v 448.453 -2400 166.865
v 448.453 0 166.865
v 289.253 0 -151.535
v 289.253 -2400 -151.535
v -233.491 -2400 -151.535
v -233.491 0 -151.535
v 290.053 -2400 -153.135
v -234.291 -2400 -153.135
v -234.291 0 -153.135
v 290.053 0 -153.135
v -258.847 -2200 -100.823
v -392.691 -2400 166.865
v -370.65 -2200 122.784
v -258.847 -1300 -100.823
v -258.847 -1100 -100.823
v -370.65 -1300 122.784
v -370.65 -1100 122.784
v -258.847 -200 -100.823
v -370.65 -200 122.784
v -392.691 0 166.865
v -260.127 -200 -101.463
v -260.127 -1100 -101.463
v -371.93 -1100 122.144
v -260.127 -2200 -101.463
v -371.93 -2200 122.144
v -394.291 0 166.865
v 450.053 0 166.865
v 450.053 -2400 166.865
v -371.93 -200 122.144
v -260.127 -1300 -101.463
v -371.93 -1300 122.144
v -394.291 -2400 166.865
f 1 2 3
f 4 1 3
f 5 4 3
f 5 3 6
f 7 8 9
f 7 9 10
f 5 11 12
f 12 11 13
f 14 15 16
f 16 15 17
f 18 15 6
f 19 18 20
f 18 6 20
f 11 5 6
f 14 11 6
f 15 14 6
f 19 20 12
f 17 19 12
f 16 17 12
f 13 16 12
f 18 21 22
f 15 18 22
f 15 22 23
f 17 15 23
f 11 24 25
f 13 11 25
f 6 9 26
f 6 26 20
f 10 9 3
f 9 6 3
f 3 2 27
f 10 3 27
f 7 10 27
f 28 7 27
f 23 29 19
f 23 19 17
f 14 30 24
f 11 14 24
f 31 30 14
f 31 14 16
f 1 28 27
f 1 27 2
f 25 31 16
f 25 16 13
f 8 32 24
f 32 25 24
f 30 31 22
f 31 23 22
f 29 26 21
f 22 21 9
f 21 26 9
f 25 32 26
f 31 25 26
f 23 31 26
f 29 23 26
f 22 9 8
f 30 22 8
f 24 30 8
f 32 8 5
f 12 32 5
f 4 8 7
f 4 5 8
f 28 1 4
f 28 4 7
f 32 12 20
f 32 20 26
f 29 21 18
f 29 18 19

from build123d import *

# Parameters (mm, degrees)
F1_DEPTH = 2400
F2_W     = 900
F2_H     = 250
F3_DEPTH = 1.6
F4_W     = 900
F4_H     = 250
F5_DEPTH = 1.6


with BuildPart() as f1:
    # F0 (on Front) → F1 (new body)
    with BuildSketch(Plane.XZ):
        Polygon((-239.018946, -140.479133), (-388.218946, 157.920867), (-392.691082, 166.865139), (-394.291082, 166.865139), (-234.291082, -153.134861), (290.052568, -153.134861), (450.052568, 166.865139), (448.452568, 166.865139), (443.980432, 157.920867), (294.780432, -140.479133), (289.252568, -151.534861), (276.891889, -151.534861), (-221.130403, -151.534861), (-233.491082, -151.534861), align=None)
    extrude(amount=F1_DEPTH)

    # F2 (on face) → F3 (cut)
    with BuildSketch(Plane(origin=(-248.68681, 0, -124.343405), x_dir=(0, -1, 0), z_dir=(-0.894427, 0, -0.447214))):
        with Locations((1750, 150.58105)):
            Rectangle(F2_W, F2_H)
    extrude(amount=-F3_DEPTH, mode=Mode.SUBTRACT)

    # F4 (on face) → F5 (cut)
    with BuildSketch(Plane(origin=(-248.68681, 0, -124.343405), x_dir=(0, -1, 0), z_dir=(-0.894427, 0, -0.447214))):
        with Locations((650, 150.58105)):
            Rectangle(F4_W, F4_H)
    extrude(amount=-F5_DEPTH, mode=Mode.SUBTRACT)


solid = f1.part
